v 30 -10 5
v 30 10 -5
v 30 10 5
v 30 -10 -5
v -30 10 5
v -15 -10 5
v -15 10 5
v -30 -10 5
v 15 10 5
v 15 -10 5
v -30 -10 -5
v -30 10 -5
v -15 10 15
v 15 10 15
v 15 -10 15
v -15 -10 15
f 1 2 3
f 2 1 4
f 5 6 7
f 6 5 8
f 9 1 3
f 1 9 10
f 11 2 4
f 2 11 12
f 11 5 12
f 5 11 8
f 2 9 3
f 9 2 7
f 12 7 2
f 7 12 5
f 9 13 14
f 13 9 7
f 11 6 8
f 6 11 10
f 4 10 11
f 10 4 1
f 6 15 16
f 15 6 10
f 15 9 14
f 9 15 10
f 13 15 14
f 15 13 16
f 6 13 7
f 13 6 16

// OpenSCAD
cube([60,20,10],center=true);
translate([0,0,10])
cube([30,20,10],center=true);
